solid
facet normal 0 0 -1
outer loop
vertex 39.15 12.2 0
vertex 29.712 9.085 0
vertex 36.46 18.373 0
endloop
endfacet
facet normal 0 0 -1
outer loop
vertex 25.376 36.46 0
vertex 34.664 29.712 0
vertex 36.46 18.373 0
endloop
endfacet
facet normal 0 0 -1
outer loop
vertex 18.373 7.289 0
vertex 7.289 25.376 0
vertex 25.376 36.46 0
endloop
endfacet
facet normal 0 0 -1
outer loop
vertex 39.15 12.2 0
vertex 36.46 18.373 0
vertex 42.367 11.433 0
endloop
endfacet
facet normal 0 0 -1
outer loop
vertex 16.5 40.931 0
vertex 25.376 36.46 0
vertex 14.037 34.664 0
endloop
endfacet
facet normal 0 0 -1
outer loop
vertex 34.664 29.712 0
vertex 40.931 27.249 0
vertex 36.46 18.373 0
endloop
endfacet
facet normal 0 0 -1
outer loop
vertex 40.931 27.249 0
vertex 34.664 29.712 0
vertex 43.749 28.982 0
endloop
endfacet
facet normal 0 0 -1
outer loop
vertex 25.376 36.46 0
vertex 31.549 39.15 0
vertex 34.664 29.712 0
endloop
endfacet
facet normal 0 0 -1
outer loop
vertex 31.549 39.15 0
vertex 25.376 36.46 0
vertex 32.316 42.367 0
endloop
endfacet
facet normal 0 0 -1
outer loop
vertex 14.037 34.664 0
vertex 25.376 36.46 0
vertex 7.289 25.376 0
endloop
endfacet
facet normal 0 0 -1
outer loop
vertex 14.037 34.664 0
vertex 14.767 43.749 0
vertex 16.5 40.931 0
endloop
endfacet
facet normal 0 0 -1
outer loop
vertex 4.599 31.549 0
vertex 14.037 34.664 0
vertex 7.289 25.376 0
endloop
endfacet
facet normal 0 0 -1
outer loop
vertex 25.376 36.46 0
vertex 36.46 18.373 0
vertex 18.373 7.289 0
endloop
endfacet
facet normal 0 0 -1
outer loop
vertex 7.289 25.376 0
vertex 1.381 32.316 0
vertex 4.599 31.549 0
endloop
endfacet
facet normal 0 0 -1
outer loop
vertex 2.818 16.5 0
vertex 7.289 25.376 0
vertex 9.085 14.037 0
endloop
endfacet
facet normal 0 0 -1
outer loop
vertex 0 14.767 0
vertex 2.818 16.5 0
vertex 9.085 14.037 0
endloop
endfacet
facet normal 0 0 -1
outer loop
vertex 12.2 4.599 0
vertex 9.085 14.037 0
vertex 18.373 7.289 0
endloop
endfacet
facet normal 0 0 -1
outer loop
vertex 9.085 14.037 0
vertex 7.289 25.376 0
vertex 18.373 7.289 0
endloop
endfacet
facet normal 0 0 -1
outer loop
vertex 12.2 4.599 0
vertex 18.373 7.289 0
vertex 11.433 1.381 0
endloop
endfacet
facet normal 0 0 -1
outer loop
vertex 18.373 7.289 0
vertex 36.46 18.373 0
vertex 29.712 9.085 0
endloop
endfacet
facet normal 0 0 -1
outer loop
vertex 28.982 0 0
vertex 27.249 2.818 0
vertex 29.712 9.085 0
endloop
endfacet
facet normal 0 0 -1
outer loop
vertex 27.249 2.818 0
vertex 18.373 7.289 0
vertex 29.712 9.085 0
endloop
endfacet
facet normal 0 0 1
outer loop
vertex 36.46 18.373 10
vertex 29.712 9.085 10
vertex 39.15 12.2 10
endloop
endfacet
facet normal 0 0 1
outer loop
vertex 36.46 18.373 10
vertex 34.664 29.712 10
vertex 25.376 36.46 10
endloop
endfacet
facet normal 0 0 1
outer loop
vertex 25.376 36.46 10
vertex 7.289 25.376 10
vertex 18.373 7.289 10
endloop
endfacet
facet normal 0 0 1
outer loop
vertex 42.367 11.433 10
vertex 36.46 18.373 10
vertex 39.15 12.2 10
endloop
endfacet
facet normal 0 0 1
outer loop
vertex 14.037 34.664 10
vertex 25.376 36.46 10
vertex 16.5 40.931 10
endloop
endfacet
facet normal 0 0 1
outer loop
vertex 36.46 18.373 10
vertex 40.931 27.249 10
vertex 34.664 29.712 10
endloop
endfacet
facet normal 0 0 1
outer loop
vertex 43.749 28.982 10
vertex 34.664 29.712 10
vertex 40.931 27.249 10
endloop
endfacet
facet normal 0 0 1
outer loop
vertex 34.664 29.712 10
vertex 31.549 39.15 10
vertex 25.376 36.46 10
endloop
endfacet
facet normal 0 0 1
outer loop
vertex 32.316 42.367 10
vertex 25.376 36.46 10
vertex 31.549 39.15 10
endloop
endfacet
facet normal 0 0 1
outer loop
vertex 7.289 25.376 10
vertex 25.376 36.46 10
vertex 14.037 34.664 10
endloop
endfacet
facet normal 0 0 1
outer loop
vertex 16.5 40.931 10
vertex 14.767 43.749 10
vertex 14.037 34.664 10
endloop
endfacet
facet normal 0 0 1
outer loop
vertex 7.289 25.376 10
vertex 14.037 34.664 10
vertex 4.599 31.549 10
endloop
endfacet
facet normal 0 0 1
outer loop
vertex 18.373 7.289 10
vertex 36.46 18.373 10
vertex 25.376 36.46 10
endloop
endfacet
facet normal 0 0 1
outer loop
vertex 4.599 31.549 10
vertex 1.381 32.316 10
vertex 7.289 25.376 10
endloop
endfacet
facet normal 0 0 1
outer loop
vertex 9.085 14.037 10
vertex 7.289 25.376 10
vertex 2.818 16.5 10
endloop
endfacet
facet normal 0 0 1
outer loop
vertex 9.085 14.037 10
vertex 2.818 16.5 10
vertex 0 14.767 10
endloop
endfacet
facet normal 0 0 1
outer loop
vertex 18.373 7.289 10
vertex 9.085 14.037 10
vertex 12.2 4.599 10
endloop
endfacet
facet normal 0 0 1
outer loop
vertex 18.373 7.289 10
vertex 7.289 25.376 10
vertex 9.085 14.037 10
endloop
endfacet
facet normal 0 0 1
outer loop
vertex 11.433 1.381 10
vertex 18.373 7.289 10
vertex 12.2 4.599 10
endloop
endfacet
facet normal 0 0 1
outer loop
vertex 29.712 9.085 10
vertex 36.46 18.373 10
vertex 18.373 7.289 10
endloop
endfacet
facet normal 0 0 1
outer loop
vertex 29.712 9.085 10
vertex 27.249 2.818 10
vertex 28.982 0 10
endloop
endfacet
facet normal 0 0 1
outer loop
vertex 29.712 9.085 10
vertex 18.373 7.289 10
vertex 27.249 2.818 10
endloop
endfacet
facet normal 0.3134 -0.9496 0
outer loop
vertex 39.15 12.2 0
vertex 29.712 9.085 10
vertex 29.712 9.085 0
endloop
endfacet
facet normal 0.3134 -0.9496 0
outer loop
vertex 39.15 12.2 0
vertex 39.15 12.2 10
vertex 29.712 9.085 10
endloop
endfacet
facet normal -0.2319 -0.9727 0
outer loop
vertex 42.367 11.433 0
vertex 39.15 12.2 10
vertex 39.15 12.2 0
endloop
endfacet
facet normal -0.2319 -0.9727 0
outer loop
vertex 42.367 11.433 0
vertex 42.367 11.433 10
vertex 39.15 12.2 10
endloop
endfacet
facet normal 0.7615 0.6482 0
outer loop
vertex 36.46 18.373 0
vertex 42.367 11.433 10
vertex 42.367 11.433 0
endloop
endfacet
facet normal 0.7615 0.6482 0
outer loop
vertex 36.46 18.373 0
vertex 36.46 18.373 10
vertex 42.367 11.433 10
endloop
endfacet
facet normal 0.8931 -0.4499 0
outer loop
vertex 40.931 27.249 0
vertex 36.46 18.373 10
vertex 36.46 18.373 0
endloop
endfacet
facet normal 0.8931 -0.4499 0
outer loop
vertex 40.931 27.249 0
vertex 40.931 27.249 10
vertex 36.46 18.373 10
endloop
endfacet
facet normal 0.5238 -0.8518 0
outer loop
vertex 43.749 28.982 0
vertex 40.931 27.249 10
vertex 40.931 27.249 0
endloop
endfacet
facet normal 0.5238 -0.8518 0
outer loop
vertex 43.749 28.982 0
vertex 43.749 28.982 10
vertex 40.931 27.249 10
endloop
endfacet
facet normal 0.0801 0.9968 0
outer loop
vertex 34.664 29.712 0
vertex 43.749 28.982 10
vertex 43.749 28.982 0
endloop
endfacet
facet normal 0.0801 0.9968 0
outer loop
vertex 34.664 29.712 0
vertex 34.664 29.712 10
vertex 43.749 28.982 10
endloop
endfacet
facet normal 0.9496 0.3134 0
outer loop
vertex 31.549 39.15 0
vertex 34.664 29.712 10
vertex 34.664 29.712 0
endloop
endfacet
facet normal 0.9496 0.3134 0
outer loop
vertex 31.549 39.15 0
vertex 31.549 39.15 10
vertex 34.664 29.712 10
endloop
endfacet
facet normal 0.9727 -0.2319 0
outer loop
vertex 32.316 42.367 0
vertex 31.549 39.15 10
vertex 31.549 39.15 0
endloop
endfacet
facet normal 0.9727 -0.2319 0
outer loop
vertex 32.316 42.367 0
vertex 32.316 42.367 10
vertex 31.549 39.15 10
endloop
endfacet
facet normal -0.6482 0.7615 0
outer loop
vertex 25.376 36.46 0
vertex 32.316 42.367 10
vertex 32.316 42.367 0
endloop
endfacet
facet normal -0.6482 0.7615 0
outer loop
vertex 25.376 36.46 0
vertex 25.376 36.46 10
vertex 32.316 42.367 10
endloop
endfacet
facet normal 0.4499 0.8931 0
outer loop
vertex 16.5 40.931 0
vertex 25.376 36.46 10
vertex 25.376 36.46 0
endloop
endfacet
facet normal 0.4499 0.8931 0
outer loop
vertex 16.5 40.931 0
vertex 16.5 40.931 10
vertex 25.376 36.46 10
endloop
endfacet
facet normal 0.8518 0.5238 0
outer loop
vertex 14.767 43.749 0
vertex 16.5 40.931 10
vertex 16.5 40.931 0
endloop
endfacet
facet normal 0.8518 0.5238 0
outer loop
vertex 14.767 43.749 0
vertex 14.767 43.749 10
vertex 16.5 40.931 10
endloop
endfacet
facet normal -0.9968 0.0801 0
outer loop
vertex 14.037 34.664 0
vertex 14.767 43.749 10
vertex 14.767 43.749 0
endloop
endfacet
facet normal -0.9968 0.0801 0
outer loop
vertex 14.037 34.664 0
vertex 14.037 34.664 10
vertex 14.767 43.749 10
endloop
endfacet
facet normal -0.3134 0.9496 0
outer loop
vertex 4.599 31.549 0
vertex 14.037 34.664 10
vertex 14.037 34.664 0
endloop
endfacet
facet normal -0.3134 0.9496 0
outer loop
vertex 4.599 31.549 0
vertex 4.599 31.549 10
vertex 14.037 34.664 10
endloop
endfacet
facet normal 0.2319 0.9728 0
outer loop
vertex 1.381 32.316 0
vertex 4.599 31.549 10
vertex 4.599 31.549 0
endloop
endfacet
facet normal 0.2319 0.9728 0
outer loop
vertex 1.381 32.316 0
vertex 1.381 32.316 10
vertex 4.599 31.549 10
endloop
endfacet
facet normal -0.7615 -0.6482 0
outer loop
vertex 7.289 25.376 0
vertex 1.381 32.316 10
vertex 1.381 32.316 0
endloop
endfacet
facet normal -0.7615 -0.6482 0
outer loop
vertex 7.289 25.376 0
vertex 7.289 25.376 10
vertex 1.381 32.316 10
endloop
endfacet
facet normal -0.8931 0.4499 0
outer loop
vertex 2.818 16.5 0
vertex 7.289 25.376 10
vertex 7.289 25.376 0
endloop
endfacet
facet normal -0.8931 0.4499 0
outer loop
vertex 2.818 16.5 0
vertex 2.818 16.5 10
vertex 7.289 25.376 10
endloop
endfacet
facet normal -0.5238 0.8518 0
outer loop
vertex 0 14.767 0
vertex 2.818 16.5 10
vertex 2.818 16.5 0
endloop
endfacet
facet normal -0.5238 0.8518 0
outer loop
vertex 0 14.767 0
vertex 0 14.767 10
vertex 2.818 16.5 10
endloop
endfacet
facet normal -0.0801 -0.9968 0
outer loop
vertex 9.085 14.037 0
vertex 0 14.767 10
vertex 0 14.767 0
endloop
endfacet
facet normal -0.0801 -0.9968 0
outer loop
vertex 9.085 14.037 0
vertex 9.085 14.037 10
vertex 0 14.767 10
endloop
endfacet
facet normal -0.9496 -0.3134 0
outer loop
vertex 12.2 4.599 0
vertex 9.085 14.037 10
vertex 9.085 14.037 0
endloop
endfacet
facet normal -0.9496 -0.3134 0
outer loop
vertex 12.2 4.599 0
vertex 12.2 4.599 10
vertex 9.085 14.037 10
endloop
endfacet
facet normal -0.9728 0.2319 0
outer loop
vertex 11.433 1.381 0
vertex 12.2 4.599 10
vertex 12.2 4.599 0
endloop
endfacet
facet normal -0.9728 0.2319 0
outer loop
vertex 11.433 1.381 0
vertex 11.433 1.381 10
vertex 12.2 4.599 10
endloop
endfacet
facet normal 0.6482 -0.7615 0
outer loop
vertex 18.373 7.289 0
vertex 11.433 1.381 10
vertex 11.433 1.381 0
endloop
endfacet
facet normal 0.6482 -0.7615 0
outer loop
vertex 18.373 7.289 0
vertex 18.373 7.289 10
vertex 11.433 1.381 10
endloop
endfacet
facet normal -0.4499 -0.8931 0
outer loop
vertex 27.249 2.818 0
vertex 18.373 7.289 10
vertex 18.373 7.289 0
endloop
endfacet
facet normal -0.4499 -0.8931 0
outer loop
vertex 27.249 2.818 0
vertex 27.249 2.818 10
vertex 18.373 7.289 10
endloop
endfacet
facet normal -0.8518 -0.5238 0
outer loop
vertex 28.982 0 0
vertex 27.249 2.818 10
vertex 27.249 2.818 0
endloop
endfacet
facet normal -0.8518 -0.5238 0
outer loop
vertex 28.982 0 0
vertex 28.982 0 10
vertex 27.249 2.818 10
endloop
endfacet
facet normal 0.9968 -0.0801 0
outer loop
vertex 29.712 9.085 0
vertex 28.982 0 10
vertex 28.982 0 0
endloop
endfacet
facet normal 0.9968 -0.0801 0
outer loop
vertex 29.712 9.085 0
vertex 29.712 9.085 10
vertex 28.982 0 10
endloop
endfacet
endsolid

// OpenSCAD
$fn = 32;

// ----------------------------------------------------------------------
// Fan rotor section: 8 blades, 15 mm hub radius, 8 mm blades
// ----------------------------------------------------------------------

// --- parameters (mm) ---
profile_height = 10;      // extrusion height
profile_points = 24;      // points of the closed outline

profile = [[36.46, 18.373], [40.931, 27.249], [43.749, 28.982], [34.664, 29.712], [31.549, 39.15], [32.316, 42.367], [25.376, 36.46], [16.5, 40.931], [14.767, 43.749], [14.037, 34.664], [4.599, 31.549], [1.381, 32.316], [7.289, 25.376], [2.818, 16.5], [0, 14.767], [9.085, 14.037], [12.2, 4.599], [11.433, 1.381], [18.373, 7.289], [27.249, 2.818], [28.982, 0], [29.712, 9.085], [39.15, 12.2], [42.367, 11.433]];  // single closed polygon, 24 points, counter clockwise

// --- the one profile operation ---
linear_extrude(height = profile_height) polygon(points = profile);
